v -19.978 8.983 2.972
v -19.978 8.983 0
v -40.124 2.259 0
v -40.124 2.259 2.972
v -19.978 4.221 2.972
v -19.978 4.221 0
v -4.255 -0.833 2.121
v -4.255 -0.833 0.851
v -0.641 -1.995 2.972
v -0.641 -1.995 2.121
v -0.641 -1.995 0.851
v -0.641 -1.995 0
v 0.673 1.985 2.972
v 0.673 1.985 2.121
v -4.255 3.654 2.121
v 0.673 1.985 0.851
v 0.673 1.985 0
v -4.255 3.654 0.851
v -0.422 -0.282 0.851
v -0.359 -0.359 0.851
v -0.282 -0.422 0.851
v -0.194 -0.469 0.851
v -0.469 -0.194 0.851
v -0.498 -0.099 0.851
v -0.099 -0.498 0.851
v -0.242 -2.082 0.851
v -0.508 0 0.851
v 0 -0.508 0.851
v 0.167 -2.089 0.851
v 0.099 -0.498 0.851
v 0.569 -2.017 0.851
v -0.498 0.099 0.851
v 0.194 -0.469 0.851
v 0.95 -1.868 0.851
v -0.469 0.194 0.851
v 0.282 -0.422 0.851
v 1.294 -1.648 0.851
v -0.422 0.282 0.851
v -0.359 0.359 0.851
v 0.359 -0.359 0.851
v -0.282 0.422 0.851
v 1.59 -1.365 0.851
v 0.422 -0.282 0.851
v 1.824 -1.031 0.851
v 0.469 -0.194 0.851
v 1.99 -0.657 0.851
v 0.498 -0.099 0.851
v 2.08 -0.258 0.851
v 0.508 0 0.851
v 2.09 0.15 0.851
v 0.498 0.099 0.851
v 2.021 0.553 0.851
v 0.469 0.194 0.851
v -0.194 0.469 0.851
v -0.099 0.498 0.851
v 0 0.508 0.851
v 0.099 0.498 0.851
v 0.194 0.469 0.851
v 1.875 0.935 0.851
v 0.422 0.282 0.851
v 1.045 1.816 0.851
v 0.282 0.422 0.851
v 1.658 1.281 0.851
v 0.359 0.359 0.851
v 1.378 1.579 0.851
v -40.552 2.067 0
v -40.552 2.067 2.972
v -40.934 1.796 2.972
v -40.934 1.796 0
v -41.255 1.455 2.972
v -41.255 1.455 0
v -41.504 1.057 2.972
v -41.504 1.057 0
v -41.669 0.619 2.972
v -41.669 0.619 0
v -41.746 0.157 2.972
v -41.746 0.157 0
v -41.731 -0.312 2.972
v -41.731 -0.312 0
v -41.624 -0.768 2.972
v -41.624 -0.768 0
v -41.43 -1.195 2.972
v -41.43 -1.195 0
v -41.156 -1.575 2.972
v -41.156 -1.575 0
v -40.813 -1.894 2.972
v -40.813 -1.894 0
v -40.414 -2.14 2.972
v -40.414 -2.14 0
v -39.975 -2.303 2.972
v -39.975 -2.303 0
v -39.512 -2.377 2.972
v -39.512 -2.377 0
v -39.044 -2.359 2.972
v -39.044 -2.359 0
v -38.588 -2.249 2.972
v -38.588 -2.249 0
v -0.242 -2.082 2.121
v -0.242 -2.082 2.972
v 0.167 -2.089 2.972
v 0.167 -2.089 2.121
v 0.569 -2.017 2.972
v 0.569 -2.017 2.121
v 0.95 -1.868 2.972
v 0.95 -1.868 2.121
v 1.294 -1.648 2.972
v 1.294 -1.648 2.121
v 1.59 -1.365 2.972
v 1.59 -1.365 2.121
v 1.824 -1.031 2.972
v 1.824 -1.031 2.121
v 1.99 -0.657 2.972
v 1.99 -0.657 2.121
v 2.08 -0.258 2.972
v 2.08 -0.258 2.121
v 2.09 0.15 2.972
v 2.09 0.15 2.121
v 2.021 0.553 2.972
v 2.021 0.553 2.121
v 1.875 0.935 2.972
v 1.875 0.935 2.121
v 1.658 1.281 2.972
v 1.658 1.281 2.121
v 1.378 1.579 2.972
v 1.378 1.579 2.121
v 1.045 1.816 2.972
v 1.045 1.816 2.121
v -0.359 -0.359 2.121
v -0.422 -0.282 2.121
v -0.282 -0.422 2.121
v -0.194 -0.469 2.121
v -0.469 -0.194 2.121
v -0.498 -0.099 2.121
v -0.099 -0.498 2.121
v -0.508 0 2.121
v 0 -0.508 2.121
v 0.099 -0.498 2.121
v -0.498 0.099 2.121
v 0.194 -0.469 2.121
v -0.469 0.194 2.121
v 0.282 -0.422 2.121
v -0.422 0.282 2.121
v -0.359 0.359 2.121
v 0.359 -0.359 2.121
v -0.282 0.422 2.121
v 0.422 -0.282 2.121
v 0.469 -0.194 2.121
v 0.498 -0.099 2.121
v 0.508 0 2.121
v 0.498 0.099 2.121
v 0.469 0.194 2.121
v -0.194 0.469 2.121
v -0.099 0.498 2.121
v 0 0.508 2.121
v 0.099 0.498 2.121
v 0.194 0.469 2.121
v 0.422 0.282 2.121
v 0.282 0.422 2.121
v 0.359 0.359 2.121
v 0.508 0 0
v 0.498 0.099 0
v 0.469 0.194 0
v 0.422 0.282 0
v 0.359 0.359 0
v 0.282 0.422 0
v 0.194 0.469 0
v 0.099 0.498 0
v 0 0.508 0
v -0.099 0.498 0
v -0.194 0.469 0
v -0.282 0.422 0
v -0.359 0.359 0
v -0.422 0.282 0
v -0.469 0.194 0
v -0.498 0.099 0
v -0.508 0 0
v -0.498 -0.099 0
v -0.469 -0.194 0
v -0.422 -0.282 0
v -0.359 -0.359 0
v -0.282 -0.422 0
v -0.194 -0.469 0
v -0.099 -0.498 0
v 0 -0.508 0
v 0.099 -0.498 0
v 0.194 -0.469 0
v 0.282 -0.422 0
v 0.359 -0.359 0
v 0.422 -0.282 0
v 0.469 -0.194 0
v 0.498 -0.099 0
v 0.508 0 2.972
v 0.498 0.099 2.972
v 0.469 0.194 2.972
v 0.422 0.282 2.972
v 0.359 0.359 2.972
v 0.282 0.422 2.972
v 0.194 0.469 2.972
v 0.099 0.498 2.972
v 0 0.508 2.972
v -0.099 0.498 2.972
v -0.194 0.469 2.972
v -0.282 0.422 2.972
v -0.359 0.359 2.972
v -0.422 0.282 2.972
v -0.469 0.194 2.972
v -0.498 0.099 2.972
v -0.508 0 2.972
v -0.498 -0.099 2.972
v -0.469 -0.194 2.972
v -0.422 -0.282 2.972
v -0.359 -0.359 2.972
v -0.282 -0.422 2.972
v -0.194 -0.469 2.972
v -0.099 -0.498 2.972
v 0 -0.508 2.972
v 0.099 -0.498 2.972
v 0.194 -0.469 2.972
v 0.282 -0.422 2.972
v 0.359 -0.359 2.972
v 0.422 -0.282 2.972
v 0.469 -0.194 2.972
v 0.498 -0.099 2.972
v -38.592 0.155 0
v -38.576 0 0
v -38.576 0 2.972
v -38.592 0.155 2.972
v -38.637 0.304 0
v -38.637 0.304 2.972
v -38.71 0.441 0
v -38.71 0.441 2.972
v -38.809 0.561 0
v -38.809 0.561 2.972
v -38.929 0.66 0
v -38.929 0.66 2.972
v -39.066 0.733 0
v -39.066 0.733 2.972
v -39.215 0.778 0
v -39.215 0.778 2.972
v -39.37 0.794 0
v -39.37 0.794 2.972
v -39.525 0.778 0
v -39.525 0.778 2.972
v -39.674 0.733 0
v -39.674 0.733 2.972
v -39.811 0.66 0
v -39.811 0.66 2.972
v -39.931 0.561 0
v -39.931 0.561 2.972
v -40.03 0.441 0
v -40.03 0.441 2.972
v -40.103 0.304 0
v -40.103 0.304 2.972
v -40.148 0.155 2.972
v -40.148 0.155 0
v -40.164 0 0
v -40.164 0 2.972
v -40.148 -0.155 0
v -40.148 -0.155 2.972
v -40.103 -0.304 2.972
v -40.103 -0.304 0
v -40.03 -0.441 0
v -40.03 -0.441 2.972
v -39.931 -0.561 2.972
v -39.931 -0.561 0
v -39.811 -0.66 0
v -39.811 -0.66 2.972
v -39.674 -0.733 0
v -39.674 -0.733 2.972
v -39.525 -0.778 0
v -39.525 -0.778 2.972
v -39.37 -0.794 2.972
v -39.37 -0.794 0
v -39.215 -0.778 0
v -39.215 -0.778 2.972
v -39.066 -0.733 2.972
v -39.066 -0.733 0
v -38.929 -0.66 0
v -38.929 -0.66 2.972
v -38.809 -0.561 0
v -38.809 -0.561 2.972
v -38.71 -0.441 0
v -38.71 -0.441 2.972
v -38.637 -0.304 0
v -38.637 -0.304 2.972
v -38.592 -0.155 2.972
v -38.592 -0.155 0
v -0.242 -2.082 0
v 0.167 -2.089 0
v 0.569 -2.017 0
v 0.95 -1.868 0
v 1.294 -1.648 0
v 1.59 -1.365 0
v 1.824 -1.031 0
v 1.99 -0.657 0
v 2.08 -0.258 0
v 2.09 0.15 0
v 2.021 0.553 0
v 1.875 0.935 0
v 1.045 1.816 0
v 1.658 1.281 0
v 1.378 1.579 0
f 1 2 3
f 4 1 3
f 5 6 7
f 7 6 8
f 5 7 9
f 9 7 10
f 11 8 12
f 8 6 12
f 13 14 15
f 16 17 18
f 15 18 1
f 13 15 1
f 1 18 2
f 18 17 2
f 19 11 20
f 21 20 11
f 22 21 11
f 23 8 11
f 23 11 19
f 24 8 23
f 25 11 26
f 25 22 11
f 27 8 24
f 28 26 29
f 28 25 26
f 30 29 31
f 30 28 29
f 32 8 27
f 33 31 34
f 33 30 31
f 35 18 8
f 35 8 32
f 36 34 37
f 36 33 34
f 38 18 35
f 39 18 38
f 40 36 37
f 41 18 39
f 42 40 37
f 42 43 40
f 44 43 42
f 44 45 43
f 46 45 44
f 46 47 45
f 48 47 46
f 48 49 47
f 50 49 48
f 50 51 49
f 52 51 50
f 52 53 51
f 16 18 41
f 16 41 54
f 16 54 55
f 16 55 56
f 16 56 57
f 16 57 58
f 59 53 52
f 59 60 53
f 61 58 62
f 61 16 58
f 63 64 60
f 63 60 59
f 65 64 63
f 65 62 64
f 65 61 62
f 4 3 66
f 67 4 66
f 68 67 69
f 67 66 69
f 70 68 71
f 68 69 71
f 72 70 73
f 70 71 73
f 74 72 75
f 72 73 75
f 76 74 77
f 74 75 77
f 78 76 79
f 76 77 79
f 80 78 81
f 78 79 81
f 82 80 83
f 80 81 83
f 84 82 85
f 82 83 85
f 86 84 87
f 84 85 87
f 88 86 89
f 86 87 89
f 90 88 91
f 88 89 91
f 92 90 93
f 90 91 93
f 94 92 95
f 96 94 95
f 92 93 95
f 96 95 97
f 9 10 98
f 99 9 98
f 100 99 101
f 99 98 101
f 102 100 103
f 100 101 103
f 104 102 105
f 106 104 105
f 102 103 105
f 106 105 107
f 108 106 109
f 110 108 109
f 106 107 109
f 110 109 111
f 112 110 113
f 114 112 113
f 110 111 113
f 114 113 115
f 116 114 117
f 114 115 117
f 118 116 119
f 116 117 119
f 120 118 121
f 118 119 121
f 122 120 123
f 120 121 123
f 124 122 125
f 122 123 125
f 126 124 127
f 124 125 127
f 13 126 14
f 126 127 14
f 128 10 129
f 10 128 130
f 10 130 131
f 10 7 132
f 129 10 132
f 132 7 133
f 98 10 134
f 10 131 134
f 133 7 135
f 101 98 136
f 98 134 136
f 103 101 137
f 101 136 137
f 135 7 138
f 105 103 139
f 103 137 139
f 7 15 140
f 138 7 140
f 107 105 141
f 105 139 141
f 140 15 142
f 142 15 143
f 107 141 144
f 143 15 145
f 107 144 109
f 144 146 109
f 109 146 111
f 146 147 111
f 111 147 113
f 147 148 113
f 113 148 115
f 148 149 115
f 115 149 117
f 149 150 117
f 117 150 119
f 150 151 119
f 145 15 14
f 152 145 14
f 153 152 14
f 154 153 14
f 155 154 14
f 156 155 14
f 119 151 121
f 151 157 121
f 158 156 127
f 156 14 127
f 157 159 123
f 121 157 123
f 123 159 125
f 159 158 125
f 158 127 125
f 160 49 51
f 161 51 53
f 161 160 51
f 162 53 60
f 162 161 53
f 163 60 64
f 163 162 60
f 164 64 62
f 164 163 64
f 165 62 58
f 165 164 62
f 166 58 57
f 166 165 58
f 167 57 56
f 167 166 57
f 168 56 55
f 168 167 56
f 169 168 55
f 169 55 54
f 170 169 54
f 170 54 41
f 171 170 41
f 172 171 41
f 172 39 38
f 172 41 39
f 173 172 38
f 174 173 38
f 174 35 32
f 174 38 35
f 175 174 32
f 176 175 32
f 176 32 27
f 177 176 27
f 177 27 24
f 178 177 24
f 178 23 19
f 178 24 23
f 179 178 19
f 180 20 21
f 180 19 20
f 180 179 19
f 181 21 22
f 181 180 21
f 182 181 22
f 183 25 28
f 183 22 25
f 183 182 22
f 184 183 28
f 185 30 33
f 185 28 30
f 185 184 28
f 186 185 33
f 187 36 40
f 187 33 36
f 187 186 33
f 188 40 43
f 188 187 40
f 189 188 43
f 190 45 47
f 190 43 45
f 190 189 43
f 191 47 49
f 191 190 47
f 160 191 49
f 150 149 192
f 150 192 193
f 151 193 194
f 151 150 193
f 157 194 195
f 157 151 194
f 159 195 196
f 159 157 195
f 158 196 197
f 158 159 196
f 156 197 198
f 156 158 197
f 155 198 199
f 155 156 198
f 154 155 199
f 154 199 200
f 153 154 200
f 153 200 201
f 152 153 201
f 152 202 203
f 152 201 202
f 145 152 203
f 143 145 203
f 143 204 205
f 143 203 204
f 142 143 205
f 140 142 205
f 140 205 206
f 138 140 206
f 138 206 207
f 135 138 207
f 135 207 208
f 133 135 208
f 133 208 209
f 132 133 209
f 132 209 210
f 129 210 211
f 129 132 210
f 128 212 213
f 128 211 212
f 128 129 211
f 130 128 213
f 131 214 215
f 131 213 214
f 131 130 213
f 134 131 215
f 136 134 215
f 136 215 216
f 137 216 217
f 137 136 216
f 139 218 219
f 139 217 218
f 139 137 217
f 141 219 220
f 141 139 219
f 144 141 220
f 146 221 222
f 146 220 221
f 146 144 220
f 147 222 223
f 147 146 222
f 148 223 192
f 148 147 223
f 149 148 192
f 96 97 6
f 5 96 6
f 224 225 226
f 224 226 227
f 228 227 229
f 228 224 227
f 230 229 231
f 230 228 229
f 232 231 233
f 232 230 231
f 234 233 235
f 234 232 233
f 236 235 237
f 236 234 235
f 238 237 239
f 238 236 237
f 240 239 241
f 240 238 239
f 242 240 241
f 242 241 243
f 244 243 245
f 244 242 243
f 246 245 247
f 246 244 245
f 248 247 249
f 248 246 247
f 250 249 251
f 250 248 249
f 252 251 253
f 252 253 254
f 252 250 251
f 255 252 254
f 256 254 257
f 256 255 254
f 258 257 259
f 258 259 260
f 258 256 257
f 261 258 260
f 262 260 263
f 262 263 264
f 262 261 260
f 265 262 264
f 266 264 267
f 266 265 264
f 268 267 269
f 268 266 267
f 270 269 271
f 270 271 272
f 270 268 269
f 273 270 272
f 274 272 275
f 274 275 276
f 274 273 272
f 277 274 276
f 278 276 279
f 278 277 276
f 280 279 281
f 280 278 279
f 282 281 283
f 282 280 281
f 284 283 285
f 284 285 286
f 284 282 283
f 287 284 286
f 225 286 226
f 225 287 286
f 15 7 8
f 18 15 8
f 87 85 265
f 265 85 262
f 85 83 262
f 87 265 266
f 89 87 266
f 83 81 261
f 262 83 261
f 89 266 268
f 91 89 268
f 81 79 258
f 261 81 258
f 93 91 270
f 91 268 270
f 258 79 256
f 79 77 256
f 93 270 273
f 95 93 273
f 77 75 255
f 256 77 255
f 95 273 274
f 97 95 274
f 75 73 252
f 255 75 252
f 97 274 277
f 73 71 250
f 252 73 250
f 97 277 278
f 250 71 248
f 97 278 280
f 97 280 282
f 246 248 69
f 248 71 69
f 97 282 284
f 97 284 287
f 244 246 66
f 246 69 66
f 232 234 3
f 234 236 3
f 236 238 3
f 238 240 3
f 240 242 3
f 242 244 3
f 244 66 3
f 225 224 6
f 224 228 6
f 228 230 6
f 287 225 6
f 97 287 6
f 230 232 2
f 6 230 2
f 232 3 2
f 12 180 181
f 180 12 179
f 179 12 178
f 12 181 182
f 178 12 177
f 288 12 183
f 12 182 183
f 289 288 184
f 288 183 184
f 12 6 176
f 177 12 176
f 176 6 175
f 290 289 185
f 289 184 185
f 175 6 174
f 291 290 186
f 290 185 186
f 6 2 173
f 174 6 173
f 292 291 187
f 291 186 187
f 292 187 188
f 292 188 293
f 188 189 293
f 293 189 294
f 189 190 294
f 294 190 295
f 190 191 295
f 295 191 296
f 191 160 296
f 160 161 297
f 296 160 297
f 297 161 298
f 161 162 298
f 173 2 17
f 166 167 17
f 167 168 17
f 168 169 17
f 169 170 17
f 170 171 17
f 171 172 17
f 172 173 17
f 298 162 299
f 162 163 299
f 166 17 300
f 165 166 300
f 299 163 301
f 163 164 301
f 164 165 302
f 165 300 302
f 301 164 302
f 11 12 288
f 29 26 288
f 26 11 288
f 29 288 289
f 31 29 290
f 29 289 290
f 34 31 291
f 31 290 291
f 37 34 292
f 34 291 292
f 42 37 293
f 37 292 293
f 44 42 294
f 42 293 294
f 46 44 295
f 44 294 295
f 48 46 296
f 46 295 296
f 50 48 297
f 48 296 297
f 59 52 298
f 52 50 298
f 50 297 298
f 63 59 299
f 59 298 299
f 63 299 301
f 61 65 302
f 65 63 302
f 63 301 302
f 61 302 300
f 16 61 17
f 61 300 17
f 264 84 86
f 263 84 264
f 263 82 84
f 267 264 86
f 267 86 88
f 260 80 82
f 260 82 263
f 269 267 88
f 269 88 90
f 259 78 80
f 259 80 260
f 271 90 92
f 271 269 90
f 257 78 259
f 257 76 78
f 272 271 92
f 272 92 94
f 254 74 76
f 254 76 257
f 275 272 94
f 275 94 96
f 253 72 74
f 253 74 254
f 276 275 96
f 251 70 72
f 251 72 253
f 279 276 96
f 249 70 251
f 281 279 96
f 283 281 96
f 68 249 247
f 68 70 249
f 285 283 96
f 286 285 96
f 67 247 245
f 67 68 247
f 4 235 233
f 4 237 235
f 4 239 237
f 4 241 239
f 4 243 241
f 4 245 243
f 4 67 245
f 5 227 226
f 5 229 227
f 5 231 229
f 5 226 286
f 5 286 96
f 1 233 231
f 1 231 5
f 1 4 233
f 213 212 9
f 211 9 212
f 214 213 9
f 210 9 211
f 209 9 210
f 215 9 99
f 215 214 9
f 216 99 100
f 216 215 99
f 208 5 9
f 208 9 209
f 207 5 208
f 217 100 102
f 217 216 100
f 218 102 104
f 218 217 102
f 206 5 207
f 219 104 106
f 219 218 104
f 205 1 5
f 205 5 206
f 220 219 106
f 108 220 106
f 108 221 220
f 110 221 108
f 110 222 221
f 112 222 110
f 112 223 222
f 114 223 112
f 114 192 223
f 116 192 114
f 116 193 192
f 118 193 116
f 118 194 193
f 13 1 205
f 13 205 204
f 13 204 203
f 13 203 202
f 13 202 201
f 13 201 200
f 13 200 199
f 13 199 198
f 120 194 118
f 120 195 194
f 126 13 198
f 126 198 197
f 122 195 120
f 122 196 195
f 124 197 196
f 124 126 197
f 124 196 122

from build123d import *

# Parameters (mm, degrees)
SKETCH1_R               = 0.79375
BOSS_EXTRUDE1_DEPTH     = 2.9718
SKETCH2_W               = 8.560637789
SKETCH2_H               = 1.27
CUT_EXTRUDE1_DEPTH      = 9.983262208
CUT_EXTRUDE1_DEPTH_BACK = 3.38125
SKETCH1_4_R             = 0.508
CUT_EXTRUDE3_DEPTH      = 3.9718
CUT_EXTRUDE3_DEPTH_BACK = 1


with BuildPart() as part:
    # Sketch1 → Boss-Extrude1 (new body)
    with BuildSketch(Plane.XY):
        with BuildLine():
            Line((-38.58806132, -2.249205074), (-19.977544146, 4.220762208))
            Line((-19.977544146, 4.220762208), (-0.641288821, -1.994960876))
            ThreePointArc((-0.641288821, -1.994960876), (1.989850963, -0.656972903), (0.672616276, 1.984617745))
            Line((0.672616276, 1.984617745), (-19.977544146, 8.983262208))
            Line((-19.977544146, 8.983262208), (-40.123930756, 2.258747435))
            ThreePointArc((-40.123930756, 2.258747435), (-41.624019757, -0.76794954), (-38.58806132, -2.249205074))
        make_face()
        with Locations((-39.37, 0)):
            Circle(SKETCH1_R, mode=Mode.SUBTRACT)
    extrude(amount=BOSS_EXTRUDE1_DEPTH)

    # Sketch2 → Cut-Extrude1 (cut, two sides)
    with BuildSketch(Plane(origin=(0, 0, 0), x_dir=(1, 0, 0), z_dir=(0, 1, 0))) as cut_extrude1_sk:
        with Locations((0.025818894, -1.4859)):
            Rectangle(SKETCH2_W, SKETCH2_H)
    extrude(amount=CUT_EXTRUDE1_DEPTH, mode=Mode.SUBTRACT)
    extrude(cut_extrude1_sk.sketch, amount=-CUT_EXTRUDE1_DEPTH_BACK, mode=Mode.SUBTRACT)

    # Sketch1<4> → Cut-Extrude3 (cut, two sides)
    with BuildSketch(Plane.XY) as cut_extrude3_sk:
        Circle(SKETCH1_4_R)
    extrude(amount=CUT_EXTRUDE3_DEPTH, mode=Mode.SUBTRACT)
    extrude(cut_extrude3_sk.sketch, amount=-CUT_EXTRUDE3_DEPTH_BACK, mode=Mode.SUBTRACT)


solid = part.part
